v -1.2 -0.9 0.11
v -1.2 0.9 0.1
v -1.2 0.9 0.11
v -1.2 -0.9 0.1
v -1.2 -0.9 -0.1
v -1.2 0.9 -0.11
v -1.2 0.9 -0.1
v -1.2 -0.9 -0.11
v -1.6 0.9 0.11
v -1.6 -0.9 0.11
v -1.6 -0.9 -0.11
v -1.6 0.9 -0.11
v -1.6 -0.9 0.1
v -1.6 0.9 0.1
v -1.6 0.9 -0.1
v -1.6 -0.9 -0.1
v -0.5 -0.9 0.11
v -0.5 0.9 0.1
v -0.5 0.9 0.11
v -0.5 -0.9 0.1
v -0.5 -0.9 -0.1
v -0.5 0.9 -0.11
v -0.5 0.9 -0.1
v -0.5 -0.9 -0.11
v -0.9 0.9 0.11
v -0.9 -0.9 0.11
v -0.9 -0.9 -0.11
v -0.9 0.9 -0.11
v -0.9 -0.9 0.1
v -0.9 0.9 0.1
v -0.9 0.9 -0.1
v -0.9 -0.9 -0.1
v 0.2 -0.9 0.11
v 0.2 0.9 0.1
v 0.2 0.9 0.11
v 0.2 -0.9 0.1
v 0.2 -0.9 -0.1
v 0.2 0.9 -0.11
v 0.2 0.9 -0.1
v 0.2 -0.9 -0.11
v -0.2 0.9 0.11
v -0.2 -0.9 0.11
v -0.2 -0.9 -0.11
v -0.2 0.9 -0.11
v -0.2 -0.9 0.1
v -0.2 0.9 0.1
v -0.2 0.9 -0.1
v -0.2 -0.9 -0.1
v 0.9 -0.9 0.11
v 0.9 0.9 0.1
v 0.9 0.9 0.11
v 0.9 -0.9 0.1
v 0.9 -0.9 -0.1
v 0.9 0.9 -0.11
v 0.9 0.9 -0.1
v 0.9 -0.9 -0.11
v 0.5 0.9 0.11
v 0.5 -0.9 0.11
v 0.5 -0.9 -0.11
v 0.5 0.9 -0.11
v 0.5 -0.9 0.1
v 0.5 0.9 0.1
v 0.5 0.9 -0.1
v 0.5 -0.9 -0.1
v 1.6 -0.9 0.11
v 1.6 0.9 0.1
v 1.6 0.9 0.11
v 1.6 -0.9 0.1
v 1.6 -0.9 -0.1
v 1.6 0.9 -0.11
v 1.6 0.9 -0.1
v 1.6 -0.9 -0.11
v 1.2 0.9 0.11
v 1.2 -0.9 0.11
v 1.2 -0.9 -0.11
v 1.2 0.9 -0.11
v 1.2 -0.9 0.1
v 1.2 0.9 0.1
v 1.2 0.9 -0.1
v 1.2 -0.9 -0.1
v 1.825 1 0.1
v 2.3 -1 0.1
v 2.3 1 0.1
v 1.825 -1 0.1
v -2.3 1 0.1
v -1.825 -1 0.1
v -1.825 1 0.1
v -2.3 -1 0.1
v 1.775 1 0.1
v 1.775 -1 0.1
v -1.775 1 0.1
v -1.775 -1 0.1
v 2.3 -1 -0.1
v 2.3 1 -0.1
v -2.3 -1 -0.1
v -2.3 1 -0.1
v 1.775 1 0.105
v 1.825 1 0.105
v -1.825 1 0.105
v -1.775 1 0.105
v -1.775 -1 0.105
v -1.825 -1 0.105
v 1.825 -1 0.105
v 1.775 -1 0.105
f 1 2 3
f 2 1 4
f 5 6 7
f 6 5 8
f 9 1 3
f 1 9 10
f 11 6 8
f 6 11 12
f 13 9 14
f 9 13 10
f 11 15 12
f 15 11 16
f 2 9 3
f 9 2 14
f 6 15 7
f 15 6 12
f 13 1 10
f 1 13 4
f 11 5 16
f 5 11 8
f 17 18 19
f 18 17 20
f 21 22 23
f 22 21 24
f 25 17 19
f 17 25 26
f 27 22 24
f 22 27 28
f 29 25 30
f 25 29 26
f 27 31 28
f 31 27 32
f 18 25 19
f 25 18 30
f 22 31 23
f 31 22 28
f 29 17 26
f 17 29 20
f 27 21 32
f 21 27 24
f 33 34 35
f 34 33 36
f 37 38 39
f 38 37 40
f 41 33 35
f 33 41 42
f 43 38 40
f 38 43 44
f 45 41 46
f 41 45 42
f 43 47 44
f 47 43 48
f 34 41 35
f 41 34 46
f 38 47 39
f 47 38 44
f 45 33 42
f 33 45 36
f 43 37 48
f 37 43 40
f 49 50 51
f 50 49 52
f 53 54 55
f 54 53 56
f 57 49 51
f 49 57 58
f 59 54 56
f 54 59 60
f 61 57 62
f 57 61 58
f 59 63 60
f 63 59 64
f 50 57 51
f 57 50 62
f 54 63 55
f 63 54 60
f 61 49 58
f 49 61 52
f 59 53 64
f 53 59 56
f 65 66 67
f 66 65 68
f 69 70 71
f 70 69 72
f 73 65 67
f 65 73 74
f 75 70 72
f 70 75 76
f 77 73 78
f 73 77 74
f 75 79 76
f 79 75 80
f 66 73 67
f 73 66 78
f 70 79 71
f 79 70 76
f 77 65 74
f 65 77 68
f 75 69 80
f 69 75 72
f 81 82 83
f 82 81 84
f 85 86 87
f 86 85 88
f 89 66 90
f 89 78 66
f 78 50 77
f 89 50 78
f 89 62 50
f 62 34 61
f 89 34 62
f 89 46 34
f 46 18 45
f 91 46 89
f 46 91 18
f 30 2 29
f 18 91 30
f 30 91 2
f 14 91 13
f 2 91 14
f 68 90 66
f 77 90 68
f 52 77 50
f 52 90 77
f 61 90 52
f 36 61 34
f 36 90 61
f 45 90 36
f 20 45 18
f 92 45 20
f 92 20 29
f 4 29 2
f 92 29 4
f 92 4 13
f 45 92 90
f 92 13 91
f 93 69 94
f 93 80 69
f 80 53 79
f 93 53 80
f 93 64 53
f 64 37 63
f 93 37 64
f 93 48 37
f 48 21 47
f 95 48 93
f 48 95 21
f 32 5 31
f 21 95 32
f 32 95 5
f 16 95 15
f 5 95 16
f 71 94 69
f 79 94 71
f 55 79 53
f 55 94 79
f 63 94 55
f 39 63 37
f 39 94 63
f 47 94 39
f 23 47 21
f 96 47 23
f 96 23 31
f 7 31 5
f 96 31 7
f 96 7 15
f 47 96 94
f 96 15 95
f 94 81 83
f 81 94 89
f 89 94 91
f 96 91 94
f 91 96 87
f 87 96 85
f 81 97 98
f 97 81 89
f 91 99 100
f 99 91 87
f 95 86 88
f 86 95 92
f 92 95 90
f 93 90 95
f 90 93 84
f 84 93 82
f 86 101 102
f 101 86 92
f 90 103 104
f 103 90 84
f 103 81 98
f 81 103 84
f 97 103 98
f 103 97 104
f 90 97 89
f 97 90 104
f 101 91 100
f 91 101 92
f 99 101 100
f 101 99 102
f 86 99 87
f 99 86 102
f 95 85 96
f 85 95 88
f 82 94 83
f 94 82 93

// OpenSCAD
module Street_05(col ="#3b4747"){
color(col)
cube([4,2,0.2], center = true);

for (i = [-1.4:0.7:1.4] ){

translate([i,0,0])
color("white")
cube([0.4,1.8,0.22], center = true);
}

translate([1.8,0,0.10])
color("white")
cube([0.05,2,0.01], center = true);

translate([-1.8,0,0.10])
color("white")
cube([0.05,2,0.01], center = true);

translate([-2.15,0,0.0])
color("GRAY")
cube([0.3,2,0.2], center = true);

translate([2.15,0,0.0])
color("GRAY")
cube([0.3,2,0.2], center = true);

}


Street_05();
